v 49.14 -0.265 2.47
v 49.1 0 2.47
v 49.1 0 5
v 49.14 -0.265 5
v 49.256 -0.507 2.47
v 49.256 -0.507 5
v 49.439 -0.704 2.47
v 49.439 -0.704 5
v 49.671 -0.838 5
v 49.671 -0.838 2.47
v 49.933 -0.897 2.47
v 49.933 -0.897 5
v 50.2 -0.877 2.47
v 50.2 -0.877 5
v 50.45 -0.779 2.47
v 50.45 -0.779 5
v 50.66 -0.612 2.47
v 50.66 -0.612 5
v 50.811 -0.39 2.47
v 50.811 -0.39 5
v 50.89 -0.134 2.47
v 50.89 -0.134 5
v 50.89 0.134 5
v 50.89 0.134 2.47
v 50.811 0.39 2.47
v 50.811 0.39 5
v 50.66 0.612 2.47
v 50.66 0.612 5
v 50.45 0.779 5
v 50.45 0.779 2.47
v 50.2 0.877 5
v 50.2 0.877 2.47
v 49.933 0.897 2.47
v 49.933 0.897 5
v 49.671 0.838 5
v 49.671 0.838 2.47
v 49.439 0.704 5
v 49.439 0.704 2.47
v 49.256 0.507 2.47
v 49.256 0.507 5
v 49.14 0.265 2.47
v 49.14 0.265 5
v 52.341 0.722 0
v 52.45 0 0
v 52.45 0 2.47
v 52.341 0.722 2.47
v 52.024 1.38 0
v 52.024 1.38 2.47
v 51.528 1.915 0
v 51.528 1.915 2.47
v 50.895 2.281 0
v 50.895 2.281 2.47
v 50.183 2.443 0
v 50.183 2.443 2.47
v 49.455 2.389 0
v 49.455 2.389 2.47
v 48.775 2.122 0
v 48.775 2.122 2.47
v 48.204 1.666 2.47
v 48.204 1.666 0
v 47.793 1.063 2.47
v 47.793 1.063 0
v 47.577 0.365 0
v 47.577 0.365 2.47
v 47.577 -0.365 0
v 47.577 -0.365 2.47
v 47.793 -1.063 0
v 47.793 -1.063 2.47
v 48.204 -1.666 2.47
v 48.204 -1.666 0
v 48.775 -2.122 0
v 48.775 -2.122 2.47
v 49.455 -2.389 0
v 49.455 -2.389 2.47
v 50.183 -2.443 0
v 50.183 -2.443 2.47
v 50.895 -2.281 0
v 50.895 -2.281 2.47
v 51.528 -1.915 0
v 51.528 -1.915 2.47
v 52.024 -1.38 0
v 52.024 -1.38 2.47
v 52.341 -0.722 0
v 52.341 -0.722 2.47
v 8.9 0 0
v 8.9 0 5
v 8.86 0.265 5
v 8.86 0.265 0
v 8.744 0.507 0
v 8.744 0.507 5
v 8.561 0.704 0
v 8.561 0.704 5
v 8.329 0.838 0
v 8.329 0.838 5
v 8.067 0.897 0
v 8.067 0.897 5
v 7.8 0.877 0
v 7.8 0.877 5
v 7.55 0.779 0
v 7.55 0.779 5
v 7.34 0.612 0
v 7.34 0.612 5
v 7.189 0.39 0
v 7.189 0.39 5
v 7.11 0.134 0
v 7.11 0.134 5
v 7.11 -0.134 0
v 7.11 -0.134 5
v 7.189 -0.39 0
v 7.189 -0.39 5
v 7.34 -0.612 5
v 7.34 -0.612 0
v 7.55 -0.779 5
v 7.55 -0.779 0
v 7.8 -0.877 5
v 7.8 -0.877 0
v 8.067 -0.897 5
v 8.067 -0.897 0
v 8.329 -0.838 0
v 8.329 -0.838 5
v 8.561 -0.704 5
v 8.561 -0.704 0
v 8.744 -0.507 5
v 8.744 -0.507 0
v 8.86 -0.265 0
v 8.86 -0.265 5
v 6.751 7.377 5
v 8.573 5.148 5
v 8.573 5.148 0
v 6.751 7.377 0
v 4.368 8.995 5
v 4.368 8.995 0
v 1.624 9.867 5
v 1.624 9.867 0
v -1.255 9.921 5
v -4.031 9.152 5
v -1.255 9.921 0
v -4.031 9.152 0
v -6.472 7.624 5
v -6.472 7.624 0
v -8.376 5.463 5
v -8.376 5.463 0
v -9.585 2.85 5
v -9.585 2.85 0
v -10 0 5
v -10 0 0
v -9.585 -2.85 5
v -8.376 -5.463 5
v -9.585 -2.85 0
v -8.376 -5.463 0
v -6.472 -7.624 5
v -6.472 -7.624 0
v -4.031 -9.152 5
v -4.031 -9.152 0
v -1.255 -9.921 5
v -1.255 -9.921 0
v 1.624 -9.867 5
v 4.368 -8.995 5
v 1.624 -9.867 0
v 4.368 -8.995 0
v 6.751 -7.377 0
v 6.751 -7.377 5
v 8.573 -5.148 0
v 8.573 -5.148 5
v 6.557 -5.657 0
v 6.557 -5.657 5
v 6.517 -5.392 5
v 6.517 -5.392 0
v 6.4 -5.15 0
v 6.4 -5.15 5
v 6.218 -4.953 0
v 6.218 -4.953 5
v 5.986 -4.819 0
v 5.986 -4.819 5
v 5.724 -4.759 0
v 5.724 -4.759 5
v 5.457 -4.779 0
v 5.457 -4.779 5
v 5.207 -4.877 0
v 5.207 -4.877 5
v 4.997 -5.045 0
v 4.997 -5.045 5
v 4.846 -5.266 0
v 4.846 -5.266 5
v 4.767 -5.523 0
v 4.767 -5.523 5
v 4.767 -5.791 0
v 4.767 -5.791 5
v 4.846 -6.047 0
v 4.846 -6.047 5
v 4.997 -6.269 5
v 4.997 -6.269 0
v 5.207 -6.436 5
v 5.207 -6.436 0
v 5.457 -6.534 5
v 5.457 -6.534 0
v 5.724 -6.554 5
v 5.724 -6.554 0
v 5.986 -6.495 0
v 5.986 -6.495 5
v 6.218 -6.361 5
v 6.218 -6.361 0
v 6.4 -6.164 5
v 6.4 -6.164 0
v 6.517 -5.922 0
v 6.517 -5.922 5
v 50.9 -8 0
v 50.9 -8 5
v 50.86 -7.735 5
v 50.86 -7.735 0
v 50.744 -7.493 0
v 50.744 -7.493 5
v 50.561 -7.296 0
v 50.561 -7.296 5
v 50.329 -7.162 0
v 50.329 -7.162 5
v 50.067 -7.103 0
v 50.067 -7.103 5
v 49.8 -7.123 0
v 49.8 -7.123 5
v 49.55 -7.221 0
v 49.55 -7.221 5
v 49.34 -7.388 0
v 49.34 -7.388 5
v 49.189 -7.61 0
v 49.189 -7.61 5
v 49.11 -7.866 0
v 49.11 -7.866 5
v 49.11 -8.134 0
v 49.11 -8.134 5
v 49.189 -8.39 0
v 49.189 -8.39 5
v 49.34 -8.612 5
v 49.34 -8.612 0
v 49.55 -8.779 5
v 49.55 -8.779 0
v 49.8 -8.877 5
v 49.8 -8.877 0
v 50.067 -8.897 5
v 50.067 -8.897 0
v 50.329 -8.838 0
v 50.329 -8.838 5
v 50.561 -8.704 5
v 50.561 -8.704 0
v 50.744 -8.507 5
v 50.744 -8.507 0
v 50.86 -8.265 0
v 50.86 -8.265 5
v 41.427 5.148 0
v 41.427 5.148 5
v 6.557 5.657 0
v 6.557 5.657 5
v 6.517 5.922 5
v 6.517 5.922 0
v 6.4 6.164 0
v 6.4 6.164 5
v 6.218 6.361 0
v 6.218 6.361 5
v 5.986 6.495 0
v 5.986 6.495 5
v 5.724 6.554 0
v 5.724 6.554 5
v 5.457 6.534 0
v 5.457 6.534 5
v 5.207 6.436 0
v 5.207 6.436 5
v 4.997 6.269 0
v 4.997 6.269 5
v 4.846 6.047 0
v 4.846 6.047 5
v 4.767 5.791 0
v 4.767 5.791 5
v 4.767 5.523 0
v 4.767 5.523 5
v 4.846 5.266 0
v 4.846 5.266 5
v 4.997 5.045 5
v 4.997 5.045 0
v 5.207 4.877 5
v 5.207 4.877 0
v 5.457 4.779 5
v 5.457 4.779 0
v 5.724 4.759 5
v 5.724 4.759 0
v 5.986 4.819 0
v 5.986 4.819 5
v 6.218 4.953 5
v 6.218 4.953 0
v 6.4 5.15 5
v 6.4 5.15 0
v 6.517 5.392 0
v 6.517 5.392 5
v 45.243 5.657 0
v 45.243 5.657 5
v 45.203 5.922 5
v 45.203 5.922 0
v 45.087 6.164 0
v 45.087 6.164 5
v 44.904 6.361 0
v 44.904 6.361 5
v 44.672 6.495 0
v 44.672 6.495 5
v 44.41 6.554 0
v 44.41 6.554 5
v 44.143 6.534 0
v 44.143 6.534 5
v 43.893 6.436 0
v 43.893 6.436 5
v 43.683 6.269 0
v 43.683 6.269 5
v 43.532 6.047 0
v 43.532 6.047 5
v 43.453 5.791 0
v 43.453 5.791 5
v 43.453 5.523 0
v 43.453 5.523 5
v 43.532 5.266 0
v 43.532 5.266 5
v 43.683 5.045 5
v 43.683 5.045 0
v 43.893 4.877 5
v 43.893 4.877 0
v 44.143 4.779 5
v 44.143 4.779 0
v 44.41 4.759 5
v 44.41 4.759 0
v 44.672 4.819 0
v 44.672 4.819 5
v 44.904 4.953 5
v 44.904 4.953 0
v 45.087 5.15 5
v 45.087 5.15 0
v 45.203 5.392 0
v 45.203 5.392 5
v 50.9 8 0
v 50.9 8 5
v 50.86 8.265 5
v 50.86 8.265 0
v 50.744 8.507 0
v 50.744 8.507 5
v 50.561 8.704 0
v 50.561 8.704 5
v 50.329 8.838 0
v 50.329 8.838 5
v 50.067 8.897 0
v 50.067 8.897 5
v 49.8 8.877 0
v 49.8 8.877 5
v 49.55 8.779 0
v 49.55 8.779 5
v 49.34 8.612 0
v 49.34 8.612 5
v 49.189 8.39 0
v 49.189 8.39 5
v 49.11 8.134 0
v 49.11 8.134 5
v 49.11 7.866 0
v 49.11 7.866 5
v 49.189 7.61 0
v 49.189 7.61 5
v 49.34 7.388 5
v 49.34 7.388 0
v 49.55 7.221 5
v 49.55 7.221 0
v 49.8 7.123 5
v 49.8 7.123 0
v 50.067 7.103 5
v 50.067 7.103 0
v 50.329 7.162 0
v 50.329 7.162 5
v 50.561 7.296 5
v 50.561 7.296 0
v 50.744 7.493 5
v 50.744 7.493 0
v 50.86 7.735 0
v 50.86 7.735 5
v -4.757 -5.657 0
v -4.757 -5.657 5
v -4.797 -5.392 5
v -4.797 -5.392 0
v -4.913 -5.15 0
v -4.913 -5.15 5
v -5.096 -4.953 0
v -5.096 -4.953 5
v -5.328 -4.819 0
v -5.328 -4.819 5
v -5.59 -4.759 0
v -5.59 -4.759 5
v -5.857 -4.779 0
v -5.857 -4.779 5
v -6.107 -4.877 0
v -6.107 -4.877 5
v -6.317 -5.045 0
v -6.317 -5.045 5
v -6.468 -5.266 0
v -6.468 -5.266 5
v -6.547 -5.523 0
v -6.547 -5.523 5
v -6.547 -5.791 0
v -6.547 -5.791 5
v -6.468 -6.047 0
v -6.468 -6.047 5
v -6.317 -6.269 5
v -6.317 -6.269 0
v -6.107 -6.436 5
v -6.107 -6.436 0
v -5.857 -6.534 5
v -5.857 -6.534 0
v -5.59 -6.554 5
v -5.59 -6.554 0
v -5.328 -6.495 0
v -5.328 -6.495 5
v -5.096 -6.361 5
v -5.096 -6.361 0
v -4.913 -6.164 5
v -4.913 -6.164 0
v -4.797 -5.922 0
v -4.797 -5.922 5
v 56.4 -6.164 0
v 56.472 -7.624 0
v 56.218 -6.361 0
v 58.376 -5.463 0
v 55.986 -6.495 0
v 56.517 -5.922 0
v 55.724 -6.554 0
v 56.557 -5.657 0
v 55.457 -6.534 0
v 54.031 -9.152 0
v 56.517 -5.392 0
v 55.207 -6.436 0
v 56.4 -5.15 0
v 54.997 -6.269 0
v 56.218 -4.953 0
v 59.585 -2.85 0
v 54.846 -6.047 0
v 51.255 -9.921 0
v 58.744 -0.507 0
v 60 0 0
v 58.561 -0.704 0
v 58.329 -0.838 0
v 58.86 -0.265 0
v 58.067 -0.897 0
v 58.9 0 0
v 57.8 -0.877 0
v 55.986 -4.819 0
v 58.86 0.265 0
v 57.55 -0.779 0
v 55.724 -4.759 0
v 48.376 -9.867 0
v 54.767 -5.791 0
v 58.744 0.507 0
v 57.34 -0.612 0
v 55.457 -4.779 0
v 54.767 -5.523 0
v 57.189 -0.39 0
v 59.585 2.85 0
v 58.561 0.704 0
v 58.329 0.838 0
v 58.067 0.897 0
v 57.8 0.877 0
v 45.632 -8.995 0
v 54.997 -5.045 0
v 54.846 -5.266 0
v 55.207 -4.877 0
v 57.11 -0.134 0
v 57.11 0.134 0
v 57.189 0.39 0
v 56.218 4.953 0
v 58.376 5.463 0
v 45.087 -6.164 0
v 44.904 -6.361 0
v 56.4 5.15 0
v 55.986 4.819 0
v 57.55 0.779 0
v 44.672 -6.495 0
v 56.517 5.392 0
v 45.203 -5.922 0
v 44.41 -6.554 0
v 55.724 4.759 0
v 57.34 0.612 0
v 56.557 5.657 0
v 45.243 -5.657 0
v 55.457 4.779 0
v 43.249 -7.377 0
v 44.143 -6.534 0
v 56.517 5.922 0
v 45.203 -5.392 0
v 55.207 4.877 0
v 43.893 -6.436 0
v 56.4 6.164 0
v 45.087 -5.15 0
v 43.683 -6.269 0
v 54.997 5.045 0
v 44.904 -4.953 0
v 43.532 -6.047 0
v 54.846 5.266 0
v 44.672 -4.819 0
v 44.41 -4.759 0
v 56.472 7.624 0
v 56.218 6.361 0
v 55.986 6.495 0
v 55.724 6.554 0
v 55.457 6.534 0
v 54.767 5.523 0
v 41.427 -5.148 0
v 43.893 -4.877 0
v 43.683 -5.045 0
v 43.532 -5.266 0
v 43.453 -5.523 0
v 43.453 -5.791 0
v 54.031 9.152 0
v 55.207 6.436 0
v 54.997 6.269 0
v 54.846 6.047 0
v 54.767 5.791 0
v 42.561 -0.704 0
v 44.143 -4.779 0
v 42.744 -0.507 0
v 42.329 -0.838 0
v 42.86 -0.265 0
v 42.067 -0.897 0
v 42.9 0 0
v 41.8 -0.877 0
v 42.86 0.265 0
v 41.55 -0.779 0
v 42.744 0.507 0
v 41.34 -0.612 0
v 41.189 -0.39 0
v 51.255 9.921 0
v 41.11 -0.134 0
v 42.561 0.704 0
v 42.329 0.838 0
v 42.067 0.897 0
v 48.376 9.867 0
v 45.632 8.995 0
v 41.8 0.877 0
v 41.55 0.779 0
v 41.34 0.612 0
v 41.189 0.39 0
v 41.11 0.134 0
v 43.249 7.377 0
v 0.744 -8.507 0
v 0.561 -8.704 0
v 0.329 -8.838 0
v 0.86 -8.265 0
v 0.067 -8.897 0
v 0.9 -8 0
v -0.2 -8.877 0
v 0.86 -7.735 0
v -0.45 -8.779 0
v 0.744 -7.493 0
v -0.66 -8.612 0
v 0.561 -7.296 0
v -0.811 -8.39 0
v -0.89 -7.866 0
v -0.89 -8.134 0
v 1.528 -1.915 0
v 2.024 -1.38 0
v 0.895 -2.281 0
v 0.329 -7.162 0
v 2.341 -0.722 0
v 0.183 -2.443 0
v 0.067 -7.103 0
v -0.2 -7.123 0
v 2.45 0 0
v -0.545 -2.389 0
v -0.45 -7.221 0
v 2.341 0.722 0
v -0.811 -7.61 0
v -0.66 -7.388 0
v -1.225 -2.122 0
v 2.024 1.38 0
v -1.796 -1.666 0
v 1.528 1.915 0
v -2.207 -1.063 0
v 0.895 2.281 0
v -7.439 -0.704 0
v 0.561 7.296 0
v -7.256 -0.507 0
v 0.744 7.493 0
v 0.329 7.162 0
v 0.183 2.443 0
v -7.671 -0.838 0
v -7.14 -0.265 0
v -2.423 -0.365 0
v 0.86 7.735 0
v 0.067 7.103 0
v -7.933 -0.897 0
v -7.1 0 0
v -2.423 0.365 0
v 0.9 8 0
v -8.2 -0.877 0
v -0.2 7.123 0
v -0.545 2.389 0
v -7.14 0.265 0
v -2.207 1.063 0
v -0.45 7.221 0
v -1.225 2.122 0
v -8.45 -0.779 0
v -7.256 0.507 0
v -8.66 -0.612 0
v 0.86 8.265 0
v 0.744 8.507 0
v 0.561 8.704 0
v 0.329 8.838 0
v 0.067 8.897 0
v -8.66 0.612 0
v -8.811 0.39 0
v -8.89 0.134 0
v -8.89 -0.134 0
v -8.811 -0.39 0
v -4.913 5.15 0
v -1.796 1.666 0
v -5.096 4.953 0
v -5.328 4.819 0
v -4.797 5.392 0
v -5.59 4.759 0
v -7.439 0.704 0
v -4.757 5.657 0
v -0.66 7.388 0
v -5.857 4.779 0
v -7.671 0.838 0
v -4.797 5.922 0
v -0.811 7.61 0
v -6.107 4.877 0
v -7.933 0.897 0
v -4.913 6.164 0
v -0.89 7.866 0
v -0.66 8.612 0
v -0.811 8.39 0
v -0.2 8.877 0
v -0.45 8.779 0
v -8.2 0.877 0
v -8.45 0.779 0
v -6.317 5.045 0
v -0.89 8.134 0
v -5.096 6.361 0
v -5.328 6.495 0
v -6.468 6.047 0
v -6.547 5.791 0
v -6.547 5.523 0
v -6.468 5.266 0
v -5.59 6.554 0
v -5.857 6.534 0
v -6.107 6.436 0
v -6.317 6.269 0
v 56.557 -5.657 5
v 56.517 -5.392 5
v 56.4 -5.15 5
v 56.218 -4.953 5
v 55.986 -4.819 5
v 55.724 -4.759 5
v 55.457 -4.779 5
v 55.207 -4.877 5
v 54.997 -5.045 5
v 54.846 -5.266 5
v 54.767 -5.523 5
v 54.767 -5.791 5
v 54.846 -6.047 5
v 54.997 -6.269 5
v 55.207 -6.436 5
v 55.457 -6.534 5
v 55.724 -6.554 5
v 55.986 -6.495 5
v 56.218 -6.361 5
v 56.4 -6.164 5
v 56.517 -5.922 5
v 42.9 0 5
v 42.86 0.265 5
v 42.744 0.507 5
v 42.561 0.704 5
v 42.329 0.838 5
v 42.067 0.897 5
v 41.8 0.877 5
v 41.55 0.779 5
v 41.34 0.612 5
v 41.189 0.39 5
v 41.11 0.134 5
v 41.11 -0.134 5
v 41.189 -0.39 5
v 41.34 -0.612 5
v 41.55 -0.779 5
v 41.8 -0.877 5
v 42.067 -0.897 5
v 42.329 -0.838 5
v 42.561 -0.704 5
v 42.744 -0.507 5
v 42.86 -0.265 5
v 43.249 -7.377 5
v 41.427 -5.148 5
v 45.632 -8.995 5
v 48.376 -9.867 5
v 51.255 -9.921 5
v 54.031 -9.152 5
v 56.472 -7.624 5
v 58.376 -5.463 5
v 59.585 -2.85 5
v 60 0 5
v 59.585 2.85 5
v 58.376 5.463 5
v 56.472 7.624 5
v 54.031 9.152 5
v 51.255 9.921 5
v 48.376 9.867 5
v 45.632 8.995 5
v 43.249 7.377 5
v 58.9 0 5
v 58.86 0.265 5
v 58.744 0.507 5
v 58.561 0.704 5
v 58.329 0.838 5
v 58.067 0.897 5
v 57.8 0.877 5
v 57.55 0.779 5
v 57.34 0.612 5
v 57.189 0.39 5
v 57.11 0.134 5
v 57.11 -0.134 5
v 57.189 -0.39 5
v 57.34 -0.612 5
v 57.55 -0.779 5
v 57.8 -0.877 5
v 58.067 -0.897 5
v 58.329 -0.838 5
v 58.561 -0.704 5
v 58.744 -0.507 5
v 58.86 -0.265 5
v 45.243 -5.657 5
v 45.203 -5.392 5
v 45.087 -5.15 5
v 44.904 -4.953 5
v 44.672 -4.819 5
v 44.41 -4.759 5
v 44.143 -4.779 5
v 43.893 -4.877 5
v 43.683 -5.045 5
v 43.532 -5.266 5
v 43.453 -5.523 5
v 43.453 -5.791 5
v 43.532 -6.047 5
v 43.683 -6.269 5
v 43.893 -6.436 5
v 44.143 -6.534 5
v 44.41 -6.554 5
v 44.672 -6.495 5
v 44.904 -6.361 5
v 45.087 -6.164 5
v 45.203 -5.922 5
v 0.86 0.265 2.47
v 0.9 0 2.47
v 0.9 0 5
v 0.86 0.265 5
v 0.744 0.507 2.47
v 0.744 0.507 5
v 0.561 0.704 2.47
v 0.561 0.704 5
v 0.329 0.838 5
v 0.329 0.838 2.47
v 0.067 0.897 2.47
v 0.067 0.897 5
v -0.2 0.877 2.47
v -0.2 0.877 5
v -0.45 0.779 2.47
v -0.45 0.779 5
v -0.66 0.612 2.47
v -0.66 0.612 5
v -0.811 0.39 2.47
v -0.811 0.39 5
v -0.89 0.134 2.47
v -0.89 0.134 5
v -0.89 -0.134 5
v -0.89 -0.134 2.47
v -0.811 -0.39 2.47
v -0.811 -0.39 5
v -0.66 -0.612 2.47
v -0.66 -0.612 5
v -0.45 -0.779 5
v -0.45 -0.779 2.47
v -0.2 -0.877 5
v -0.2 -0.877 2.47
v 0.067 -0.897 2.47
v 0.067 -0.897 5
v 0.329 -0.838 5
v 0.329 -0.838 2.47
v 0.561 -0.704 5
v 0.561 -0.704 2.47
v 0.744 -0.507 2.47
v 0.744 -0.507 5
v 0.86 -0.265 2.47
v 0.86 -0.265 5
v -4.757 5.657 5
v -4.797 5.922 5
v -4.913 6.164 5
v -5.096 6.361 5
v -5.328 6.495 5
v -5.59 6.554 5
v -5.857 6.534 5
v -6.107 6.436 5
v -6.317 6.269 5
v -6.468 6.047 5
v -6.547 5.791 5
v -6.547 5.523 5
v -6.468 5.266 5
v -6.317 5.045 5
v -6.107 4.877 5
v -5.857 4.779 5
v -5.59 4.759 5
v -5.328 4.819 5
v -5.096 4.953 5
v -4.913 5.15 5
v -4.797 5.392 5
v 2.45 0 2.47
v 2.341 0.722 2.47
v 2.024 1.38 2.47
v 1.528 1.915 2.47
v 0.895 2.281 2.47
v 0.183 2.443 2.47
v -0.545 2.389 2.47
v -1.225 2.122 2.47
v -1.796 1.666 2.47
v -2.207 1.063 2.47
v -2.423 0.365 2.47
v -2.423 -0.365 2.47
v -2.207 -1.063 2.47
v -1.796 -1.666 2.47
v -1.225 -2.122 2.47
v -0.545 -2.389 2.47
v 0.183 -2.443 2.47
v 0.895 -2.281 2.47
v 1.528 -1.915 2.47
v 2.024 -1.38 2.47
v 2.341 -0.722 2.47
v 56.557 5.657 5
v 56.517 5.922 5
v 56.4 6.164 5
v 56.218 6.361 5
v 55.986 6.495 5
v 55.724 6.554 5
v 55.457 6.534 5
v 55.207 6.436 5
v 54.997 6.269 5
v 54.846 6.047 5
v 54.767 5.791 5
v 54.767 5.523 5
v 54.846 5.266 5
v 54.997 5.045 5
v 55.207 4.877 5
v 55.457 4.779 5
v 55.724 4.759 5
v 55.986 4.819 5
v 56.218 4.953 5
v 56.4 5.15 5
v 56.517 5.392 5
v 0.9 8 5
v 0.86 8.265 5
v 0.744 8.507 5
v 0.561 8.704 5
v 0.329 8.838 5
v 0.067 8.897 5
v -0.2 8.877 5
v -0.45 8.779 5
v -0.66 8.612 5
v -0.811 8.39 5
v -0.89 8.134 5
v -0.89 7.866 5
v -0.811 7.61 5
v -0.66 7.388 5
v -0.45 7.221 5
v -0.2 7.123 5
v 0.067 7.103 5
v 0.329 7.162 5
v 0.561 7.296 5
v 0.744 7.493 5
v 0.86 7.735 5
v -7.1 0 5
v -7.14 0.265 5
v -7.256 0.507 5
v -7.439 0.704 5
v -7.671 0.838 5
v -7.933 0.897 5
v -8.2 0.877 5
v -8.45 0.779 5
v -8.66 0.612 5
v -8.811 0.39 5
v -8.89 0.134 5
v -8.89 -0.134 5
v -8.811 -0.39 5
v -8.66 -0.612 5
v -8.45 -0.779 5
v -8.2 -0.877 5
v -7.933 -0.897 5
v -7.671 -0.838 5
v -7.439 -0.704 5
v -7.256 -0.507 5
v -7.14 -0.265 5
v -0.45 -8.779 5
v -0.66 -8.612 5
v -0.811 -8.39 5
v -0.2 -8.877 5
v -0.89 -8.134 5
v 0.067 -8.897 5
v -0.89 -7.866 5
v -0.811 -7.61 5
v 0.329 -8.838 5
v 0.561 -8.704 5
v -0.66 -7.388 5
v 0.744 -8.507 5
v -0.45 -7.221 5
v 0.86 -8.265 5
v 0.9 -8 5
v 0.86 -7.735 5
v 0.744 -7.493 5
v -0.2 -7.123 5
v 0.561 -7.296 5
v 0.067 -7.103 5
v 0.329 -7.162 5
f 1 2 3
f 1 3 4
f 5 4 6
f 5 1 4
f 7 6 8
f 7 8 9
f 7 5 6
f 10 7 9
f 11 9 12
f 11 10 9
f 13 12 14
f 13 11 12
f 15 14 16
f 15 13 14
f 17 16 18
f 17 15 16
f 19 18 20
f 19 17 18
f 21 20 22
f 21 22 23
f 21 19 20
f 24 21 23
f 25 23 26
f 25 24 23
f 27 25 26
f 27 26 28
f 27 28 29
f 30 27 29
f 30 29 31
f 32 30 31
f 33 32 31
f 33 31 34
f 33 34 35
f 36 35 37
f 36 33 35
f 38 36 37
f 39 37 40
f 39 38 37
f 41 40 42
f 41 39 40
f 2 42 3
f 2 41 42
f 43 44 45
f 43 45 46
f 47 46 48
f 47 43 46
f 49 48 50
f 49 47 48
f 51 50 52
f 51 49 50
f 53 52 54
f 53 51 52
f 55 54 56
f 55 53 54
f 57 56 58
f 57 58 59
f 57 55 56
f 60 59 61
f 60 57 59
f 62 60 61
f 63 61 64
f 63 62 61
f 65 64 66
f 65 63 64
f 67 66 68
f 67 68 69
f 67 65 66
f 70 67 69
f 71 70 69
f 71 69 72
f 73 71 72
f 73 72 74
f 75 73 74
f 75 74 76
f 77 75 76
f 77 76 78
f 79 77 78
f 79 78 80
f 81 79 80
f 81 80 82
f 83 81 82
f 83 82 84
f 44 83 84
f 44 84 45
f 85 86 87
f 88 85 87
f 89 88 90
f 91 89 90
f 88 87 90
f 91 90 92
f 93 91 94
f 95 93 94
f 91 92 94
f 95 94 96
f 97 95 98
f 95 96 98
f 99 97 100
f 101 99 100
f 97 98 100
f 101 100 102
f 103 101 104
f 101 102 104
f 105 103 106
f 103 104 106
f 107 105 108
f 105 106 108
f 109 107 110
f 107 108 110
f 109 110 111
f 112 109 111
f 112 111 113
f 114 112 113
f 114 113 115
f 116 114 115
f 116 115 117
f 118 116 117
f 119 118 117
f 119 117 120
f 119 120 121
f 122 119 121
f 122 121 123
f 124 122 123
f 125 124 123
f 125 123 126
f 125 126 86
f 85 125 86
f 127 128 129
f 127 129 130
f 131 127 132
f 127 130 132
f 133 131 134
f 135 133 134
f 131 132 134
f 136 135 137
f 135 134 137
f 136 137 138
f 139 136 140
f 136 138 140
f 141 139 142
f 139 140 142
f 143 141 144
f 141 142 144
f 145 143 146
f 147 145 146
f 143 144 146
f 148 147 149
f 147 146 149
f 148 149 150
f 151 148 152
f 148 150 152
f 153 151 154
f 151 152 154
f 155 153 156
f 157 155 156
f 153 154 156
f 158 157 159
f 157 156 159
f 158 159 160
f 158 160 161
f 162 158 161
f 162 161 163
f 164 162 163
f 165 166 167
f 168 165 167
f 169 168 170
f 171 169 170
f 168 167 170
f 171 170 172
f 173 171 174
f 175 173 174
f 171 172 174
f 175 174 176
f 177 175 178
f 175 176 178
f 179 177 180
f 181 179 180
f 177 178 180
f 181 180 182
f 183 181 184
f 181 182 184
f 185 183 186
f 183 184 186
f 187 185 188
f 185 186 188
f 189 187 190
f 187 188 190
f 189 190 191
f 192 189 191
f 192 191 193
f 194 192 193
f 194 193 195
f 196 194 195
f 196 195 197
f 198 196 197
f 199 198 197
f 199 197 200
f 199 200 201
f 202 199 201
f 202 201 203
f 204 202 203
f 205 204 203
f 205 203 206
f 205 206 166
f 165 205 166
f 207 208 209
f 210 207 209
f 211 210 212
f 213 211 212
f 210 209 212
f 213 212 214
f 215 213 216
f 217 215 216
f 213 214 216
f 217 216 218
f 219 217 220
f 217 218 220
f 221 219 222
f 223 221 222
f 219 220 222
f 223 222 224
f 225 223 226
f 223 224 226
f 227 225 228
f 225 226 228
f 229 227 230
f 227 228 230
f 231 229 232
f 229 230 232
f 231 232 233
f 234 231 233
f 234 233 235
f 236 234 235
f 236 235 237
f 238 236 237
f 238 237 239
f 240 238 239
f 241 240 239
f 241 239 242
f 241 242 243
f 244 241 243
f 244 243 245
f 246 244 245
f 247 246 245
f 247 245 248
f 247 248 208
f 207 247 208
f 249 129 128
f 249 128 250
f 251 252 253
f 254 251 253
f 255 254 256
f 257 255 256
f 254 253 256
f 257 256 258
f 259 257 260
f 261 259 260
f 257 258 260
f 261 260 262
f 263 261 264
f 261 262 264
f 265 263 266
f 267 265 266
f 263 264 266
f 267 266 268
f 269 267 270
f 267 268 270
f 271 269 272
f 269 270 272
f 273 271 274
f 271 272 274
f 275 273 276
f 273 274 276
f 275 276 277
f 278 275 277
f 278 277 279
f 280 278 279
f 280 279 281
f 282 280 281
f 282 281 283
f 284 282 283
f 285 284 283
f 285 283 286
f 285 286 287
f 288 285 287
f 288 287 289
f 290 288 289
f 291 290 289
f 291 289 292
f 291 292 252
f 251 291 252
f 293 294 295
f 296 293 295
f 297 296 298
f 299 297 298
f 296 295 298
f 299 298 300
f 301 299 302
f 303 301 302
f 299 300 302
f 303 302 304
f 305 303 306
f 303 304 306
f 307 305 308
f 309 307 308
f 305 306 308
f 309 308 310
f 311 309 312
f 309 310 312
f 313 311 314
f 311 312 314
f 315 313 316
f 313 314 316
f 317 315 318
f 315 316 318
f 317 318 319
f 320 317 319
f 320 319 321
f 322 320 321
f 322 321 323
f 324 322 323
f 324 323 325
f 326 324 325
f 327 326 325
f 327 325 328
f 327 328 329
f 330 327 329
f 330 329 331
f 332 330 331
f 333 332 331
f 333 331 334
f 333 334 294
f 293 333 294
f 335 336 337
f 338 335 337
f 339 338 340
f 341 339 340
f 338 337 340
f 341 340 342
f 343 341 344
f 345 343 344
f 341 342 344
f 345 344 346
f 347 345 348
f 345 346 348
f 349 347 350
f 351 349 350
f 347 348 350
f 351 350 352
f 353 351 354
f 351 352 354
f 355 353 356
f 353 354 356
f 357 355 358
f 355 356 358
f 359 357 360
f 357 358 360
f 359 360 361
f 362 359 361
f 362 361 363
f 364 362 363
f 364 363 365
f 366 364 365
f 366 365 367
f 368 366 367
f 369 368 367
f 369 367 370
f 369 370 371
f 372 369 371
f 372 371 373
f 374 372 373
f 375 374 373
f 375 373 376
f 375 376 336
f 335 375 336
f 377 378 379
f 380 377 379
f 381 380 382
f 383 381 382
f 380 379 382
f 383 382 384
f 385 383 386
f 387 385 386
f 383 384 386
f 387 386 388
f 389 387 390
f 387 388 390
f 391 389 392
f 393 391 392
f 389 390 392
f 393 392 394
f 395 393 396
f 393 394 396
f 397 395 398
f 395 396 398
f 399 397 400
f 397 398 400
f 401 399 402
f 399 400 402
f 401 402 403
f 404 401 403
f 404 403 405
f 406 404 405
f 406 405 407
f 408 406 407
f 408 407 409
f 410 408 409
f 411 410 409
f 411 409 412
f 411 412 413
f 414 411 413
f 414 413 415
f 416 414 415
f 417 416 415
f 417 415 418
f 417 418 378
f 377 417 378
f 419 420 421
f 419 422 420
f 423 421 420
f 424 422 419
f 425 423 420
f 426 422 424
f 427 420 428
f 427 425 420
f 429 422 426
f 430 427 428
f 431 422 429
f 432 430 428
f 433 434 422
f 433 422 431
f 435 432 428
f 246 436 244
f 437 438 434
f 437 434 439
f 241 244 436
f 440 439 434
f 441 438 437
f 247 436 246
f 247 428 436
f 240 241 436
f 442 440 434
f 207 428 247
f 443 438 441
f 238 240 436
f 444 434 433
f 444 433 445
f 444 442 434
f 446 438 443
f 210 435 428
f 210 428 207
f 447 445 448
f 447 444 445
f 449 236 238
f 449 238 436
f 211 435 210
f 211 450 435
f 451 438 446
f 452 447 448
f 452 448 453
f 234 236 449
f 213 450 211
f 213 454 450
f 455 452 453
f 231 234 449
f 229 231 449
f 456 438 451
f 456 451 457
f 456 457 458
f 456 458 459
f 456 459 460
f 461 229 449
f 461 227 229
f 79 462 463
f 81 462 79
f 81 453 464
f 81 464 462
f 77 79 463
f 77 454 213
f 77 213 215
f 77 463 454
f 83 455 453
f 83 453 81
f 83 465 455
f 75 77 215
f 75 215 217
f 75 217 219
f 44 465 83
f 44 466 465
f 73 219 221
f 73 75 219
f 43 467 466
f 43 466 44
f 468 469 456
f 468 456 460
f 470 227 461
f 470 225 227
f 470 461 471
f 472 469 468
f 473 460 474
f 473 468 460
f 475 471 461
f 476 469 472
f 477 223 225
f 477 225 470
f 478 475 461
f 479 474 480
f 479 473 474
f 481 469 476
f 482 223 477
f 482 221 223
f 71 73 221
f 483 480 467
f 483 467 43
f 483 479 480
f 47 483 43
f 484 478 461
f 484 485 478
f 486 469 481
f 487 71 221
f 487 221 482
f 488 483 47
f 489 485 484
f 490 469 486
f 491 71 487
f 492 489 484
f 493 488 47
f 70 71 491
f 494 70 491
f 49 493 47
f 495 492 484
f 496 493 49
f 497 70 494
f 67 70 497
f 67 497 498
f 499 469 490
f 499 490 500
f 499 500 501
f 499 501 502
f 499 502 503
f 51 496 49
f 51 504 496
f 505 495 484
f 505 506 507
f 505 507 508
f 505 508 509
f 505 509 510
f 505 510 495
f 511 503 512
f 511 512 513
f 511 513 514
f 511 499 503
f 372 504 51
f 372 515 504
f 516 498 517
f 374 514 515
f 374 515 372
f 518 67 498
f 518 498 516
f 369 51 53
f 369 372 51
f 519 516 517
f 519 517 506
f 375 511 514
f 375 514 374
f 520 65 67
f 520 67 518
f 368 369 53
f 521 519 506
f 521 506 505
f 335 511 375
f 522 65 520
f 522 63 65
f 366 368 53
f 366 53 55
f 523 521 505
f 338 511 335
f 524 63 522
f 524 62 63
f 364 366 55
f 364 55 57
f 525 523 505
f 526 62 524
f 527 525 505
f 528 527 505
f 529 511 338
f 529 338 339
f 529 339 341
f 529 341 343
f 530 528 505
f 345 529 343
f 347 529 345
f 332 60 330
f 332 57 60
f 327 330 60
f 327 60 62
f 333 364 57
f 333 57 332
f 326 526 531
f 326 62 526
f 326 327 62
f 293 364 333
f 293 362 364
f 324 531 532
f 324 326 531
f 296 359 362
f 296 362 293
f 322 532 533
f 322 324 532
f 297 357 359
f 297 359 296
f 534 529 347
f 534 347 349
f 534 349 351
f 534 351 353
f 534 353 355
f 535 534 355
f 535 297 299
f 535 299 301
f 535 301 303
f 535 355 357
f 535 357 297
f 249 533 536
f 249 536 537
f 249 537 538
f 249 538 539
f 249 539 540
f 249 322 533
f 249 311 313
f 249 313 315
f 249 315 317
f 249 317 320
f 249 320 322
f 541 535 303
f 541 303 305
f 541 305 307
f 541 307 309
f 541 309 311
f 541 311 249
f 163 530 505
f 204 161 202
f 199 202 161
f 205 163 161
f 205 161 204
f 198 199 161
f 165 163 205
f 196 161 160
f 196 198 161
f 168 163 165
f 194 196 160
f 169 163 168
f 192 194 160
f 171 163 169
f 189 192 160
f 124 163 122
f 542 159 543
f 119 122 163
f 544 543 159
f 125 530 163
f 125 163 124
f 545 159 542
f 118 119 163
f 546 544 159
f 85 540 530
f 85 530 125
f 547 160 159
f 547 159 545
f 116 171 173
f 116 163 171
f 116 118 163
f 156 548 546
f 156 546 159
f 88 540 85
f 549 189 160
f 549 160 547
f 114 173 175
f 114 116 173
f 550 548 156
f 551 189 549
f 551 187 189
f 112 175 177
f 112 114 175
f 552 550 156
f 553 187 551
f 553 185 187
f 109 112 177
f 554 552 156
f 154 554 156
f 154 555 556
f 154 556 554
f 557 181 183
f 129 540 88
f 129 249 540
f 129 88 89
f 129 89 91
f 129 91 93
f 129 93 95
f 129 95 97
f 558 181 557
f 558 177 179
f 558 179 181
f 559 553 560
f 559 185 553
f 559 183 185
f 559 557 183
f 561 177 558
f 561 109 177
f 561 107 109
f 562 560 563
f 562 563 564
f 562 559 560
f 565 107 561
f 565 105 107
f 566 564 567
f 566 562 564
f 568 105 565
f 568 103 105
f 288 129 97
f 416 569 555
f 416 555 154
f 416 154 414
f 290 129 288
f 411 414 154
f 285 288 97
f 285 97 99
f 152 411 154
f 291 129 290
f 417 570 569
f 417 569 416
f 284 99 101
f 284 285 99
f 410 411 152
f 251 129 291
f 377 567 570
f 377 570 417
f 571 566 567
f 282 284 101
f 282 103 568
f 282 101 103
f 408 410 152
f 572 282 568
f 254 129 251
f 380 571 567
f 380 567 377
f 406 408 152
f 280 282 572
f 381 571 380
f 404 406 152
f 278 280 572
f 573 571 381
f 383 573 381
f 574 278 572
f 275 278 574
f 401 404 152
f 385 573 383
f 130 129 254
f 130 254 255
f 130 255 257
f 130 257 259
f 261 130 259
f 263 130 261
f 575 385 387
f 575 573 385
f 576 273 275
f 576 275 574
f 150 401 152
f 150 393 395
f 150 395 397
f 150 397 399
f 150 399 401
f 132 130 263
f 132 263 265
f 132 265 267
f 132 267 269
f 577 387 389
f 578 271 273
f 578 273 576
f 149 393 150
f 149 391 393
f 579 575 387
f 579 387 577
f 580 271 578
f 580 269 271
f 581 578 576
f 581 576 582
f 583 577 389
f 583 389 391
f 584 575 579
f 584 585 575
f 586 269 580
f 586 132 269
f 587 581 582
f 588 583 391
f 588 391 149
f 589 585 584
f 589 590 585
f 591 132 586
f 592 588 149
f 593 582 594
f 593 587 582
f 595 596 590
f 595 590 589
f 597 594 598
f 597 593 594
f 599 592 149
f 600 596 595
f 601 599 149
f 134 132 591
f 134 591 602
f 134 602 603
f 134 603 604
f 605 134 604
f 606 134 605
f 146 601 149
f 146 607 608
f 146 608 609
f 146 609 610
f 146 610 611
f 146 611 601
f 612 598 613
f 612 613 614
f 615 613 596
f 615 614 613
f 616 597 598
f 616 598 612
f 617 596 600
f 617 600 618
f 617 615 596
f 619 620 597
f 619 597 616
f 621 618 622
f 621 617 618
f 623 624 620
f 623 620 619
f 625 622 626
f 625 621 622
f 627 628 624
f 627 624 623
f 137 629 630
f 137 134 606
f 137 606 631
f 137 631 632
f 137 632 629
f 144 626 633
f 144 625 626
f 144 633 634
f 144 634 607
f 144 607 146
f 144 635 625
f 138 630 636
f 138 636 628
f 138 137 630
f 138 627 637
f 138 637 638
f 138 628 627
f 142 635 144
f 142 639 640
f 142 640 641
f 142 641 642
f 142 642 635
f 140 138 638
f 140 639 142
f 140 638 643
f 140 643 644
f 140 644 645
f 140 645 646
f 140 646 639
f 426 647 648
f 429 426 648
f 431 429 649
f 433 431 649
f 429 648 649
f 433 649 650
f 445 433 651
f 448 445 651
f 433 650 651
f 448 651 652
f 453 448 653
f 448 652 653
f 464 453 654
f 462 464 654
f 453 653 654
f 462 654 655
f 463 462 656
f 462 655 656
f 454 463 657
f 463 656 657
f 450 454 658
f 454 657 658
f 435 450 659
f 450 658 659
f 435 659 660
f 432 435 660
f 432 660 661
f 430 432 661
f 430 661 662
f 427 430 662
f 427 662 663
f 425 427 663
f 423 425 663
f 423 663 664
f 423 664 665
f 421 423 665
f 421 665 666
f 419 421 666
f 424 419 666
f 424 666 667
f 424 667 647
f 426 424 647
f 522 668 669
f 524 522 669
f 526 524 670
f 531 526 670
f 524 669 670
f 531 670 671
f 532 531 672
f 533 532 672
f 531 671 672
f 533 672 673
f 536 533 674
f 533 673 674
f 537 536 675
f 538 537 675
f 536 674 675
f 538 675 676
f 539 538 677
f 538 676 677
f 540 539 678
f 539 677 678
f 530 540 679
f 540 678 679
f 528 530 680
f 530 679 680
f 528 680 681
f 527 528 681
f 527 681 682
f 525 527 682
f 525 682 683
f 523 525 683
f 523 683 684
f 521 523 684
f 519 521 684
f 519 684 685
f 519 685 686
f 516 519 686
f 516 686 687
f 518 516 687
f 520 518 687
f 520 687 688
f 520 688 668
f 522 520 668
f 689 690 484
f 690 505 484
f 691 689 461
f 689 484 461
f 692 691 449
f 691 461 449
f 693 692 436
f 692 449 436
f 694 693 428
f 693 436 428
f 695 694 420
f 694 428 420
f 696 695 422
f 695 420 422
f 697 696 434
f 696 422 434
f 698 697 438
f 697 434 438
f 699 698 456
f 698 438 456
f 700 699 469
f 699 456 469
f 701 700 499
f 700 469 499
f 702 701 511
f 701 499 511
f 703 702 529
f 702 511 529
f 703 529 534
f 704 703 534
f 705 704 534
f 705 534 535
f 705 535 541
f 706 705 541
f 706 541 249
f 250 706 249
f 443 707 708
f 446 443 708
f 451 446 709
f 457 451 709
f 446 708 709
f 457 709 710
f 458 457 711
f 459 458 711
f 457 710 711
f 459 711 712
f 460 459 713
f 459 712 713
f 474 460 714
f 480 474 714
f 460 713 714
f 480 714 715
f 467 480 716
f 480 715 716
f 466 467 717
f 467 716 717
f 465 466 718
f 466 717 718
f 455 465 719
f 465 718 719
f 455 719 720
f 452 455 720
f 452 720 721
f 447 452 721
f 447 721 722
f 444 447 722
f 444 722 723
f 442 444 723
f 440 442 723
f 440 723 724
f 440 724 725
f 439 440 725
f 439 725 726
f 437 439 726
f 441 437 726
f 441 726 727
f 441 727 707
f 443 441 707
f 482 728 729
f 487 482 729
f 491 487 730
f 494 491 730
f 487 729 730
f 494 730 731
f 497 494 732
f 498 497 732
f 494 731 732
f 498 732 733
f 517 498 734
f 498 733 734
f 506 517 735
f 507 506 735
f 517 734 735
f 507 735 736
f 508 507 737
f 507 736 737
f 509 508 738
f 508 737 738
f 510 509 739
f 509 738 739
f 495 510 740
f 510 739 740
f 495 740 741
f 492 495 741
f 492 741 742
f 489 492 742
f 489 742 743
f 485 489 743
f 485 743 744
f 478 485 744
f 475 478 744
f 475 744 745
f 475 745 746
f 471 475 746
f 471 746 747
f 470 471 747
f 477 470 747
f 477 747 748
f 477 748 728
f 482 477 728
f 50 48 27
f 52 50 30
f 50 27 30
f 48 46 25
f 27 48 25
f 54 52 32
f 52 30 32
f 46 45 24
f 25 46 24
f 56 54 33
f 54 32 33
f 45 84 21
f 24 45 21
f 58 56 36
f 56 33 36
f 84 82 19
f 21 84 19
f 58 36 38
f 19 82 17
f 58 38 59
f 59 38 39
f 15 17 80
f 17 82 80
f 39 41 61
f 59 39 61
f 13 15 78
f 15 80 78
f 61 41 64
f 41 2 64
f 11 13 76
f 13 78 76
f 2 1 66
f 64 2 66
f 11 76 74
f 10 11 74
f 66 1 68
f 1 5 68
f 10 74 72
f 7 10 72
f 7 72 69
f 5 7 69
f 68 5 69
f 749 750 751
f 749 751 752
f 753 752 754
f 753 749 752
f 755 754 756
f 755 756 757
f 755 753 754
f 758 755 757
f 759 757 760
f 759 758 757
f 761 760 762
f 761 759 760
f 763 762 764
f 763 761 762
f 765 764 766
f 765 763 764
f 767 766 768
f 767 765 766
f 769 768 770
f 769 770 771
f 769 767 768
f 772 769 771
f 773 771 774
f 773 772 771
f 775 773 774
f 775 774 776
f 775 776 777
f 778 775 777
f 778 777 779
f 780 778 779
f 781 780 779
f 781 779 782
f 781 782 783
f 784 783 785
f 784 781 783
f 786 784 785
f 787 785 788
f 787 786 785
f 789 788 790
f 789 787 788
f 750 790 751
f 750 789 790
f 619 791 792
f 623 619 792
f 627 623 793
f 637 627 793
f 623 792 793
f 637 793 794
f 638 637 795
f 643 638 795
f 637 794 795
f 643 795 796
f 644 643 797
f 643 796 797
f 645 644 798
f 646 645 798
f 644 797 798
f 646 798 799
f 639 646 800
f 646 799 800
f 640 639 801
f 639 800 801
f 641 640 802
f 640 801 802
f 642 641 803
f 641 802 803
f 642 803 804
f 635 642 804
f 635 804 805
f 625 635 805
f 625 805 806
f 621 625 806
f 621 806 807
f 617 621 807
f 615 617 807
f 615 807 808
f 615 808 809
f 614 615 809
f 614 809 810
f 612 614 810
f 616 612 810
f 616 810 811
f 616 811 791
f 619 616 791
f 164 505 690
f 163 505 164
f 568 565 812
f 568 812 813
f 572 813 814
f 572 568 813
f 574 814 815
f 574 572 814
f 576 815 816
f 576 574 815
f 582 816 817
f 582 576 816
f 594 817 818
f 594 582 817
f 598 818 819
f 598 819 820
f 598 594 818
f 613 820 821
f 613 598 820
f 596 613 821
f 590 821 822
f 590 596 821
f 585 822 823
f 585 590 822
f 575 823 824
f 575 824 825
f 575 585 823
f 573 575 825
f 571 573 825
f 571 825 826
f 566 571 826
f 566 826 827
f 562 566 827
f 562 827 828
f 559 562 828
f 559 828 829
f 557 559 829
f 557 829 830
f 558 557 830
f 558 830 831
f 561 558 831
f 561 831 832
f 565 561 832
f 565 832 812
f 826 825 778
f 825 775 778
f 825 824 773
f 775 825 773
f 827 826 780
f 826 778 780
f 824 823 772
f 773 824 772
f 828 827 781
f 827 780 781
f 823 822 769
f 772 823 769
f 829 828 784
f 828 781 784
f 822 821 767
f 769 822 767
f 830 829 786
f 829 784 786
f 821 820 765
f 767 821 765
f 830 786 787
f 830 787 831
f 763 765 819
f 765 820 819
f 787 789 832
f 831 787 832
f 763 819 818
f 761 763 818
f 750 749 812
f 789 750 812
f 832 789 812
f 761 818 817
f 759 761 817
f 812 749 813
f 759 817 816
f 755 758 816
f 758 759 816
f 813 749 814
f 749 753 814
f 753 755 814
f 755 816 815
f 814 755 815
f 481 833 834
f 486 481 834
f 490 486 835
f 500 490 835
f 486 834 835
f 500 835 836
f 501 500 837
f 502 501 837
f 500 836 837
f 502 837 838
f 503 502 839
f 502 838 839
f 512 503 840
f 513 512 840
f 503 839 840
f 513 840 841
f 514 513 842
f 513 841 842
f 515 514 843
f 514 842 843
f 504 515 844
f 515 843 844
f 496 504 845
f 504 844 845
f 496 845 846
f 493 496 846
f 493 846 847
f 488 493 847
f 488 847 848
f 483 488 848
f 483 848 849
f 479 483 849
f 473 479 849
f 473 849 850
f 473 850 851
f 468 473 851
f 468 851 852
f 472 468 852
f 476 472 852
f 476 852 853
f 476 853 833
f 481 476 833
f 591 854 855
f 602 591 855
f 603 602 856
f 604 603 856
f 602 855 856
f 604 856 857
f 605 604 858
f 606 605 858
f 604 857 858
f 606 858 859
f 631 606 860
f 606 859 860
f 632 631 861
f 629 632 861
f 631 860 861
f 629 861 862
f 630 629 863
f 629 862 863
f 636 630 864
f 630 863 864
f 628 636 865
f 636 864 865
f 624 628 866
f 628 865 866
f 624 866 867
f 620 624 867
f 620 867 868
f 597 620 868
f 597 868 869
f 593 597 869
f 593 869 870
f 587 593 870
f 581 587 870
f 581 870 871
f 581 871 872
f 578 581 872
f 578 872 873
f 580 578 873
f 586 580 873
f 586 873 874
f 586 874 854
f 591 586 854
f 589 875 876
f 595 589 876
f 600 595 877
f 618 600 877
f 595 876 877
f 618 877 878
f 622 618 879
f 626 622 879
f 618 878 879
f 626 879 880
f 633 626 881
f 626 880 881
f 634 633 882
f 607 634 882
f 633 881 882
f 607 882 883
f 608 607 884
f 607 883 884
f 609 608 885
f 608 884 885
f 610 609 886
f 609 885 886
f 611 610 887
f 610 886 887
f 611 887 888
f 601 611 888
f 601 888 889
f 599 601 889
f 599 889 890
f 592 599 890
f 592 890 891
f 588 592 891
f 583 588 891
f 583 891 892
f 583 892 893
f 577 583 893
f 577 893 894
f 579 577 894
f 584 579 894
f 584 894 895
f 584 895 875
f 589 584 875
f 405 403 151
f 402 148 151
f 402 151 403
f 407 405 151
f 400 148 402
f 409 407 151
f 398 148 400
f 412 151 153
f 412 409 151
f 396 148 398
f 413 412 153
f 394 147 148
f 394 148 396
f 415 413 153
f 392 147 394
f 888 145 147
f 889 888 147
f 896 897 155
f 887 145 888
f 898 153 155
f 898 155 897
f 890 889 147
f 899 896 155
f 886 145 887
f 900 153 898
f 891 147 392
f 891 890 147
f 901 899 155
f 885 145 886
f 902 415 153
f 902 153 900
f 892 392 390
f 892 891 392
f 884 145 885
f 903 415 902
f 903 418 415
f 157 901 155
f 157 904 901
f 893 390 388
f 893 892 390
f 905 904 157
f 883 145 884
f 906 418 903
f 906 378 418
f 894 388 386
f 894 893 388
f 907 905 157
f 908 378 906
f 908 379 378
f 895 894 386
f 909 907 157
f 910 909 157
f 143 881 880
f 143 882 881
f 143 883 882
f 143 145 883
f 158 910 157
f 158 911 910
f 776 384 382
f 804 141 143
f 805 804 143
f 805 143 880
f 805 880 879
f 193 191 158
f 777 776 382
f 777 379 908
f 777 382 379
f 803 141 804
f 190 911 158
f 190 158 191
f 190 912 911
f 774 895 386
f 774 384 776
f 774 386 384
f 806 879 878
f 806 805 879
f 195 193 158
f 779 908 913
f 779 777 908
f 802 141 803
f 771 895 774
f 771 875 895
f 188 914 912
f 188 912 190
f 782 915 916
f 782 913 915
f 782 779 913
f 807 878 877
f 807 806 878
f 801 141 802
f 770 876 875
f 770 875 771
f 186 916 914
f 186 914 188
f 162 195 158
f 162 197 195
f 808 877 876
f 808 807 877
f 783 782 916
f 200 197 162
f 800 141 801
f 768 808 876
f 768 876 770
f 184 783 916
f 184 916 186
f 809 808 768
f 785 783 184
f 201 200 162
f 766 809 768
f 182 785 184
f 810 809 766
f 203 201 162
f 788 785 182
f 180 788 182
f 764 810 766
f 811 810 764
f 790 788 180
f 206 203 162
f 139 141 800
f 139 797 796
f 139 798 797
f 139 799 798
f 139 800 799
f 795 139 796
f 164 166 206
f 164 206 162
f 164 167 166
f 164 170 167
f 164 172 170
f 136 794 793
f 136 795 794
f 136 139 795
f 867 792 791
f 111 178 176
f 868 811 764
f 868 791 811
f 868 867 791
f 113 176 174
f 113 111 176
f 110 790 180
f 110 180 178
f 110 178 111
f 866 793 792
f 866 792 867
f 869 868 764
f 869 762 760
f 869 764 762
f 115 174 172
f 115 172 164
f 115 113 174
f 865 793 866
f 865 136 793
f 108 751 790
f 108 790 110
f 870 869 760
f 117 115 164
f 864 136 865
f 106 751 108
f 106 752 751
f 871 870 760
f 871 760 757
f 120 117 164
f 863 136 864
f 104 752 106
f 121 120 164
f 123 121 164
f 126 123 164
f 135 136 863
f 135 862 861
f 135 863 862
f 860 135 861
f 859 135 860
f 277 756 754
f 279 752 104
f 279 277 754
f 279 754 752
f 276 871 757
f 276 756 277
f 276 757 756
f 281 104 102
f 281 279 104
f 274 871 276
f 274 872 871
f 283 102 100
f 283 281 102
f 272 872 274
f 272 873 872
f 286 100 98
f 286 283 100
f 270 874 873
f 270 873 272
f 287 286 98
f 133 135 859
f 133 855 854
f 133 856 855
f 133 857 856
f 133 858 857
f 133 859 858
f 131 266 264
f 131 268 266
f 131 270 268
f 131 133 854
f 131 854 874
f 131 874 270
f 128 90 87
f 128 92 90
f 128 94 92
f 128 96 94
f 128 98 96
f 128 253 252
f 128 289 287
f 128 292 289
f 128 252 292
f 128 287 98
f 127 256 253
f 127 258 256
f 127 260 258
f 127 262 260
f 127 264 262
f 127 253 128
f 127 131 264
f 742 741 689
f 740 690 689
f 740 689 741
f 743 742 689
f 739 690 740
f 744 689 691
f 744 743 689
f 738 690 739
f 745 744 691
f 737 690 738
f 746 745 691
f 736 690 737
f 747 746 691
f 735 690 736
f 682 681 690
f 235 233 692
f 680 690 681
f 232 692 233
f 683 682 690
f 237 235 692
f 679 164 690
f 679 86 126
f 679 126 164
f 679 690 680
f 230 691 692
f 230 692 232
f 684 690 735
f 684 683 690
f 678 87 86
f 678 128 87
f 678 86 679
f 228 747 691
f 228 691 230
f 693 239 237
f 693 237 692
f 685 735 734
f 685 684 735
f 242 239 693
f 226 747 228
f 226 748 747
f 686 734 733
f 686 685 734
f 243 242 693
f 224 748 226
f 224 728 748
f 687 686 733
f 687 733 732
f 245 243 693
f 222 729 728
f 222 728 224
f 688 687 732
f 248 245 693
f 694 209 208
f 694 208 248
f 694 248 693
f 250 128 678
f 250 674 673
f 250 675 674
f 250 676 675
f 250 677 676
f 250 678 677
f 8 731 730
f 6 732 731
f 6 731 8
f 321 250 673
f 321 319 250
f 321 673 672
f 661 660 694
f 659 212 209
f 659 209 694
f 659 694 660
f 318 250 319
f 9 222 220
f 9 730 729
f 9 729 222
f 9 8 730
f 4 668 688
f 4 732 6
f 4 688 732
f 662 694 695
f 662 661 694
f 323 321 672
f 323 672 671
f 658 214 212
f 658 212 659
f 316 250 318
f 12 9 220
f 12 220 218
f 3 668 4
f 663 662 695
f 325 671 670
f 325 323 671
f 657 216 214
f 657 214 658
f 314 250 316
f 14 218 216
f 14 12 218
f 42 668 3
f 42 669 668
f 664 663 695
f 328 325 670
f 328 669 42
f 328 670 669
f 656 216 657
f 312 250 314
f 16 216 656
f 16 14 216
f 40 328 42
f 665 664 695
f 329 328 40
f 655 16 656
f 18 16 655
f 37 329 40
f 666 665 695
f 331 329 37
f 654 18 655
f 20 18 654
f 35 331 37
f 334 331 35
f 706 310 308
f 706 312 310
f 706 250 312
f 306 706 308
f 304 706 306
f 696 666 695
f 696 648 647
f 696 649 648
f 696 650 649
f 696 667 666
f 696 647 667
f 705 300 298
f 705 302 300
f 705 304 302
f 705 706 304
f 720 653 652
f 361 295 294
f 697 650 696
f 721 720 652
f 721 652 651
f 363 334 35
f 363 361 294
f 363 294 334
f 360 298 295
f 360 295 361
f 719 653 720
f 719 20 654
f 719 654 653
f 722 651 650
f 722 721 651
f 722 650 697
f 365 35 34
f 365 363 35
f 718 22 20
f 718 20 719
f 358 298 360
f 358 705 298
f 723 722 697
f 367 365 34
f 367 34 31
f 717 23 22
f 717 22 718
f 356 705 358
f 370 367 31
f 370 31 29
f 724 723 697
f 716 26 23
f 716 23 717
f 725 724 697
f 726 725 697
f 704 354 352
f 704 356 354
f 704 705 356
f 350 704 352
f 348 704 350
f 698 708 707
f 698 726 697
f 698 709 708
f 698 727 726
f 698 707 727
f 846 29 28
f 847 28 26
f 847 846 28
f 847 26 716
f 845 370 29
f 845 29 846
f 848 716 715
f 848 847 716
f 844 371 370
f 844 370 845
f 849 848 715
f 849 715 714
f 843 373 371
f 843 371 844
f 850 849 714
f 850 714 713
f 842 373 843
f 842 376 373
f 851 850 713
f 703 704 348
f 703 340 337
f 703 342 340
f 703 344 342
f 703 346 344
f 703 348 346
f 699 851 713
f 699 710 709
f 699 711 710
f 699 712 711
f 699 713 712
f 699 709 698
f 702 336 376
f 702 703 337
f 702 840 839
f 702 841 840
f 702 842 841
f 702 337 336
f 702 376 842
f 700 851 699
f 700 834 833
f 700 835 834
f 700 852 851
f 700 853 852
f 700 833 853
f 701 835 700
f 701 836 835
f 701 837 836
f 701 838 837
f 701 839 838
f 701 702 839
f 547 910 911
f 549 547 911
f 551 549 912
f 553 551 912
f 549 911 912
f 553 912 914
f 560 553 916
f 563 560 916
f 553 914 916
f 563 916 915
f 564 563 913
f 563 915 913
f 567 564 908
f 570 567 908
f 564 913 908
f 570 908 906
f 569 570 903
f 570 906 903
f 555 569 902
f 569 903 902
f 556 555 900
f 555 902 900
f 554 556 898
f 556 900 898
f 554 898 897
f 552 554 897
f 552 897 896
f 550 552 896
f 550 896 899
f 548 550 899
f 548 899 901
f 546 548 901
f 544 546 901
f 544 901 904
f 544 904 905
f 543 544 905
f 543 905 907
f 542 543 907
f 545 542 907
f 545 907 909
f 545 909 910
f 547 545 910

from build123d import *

# Parameters (mm, degrees)
ESQUISSE1_R             = 2.45
BOSS_EXTRU_1_DEPTH      = 5
BOSS_EXTRU_2_START      = -2.53
ESQUISSE2_R             = 2.45
ESQUISSE2_R_2           = 0.9
BOSS_EXTRU_2_DEPTH      = 2.53
BOSS_EXTRU_4_START      = -5
ESQUISSE4_R             = 10
ESQUISSE4_R_2           = 2.45
BOSS_EXTRU_4_DEPTH      = 5
ESQUISSE5_R             = 0.9
ENL_V_MAT_EXTRU_3_DEPTH = 10


with BuildPart() as part:
    # Esquisse1 → Boss.-Extru.1 (new body)
    with BuildSketch(Plane.XY):
        with BuildLine():
            Line((0, 5.147731849), (50, 5.147731849))
            ThreePointArc((50, 5.147731849), (55.147731849, 0), (50, -5.147731849))
            Line((50, -5.147731849), (0, -5.147731849))
            ThreePointArc((0, -5.147731849), (-5.147731849, 0), (0, 5.147731849))
        make_face()
        Circle(ESQUISSE1_R, mode=Mode.SUBTRACT)
        with Locations((50, 0)):
            Circle(ESQUISSE1_R, mode=Mode.SUBTRACT)
    extrude(amount=BOSS_EXTRU_1_DEPTH)

    # Esquisse2 → Boss.-Extru.2 (add)
    # profile 1 of 2: a face of its own
    with BuildSketch(Plane.XY.offset(5).offset(BOSS_EXTRU_2_START)):
        Circle(ESQUISSE2_R)
        Circle(ESQUISSE2_R_2, mode=Mode.SUBTRACT)
    # profile 2 of 2: a face of its own
    with BuildSketch(Plane.XY.offset(5).offset(BOSS_EXTRU_2_START)):
        with Locations(Location((50, 0, 0), (0, 0, 180))):
            Circle(ESQUISSE2_R)
        with Locations(Location((50, 0, 0), (0, 0, 180))):
            Circle(ESQUISSE2_R_2, mode=Mode.SUBTRACT)
    extrude(amount=BOSS_EXTRU_2_DEPTH)

    # Esquisse4 → Boss.-Extru.4 (add)
    # profile 1 of 2: a face of its own
    with BuildSketch(Plane.XY.offset(5).offset(BOSS_EXTRU_4_START)):
        Circle(ESQUISSE4_R)
        Circle(ESQUISSE4_R_2, mode=Mode.SUBTRACT)
    # profile 2 of 2: a face of its own
    with BuildSketch(Plane.XY.offset(5).offset(BOSS_EXTRU_4_START)):
        with Locations((50, 0)):
            Circle(ESQUISSE4_R)
        with Locations(Location((50, 0, 0), (0, 0, 180))):
            Circle(ESQUISSE4_R_2, mode=Mode.SUBTRACT)
    extrude(amount=BOSS_EXTRU_4_DEPTH)

    # Esquisse5 → Enlèv. mat.-Extru.3 (cut)
    with BuildSketch(Plane.XY.offset(5)):
        with Locations((-8, 0)):
            Circle(ESQUISSE5_R)
        with Locations((-5.656854249, 5.656854249)):
            Circle(ESQUISSE5_R)
        with Locations((0, 8)):
            Circle(ESQUISSE5_R)
        with Locations((5.656854249, 5.656854249)):
            Circle(ESQUISSE5_R)
        with Locations((8, 0)):
            Circle(ESQUISSE5_R)
        with Locations((5.656854249, -5.656854249)):
            Circle(ESQUISSE5_R)
        with Locations((0, -8)):
            Circle(ESQUISSE5_R)
        with Locations((-5.656854249, -5.656854249)):
            Circle(ESQUISSE5_R)
        with Locations((44.343145751, 5.656854249)):
            Circle(ESQUISSE5_R)
        with Locations((42, 0)):
            Circle(ESQUISSE5_R)
        with Locations((44.343145751, -5.656854249)):
            Circle(ESQUISSE5_R)
        with Locations((50, -8)):
            Circle(ESQUISSE5_R)
        with Locations((55.656854249, -5.656854249)):
            Circle(ESQUISSE5_R)
        with Locations((58, 0)):
            Circle(ESQUISSE5_R)
        with Locations((55.656854249, 5.656854249)):
            Circle(ESQUISSE5_R)
        with Locations((50, 8)):
            Circle(ESQUISSE5_R)
    extrude(amount=-ENL_V_MAT_EXTRU_3_DEPTH, mode=Mode.SUBTRACT)


solid = part.part
